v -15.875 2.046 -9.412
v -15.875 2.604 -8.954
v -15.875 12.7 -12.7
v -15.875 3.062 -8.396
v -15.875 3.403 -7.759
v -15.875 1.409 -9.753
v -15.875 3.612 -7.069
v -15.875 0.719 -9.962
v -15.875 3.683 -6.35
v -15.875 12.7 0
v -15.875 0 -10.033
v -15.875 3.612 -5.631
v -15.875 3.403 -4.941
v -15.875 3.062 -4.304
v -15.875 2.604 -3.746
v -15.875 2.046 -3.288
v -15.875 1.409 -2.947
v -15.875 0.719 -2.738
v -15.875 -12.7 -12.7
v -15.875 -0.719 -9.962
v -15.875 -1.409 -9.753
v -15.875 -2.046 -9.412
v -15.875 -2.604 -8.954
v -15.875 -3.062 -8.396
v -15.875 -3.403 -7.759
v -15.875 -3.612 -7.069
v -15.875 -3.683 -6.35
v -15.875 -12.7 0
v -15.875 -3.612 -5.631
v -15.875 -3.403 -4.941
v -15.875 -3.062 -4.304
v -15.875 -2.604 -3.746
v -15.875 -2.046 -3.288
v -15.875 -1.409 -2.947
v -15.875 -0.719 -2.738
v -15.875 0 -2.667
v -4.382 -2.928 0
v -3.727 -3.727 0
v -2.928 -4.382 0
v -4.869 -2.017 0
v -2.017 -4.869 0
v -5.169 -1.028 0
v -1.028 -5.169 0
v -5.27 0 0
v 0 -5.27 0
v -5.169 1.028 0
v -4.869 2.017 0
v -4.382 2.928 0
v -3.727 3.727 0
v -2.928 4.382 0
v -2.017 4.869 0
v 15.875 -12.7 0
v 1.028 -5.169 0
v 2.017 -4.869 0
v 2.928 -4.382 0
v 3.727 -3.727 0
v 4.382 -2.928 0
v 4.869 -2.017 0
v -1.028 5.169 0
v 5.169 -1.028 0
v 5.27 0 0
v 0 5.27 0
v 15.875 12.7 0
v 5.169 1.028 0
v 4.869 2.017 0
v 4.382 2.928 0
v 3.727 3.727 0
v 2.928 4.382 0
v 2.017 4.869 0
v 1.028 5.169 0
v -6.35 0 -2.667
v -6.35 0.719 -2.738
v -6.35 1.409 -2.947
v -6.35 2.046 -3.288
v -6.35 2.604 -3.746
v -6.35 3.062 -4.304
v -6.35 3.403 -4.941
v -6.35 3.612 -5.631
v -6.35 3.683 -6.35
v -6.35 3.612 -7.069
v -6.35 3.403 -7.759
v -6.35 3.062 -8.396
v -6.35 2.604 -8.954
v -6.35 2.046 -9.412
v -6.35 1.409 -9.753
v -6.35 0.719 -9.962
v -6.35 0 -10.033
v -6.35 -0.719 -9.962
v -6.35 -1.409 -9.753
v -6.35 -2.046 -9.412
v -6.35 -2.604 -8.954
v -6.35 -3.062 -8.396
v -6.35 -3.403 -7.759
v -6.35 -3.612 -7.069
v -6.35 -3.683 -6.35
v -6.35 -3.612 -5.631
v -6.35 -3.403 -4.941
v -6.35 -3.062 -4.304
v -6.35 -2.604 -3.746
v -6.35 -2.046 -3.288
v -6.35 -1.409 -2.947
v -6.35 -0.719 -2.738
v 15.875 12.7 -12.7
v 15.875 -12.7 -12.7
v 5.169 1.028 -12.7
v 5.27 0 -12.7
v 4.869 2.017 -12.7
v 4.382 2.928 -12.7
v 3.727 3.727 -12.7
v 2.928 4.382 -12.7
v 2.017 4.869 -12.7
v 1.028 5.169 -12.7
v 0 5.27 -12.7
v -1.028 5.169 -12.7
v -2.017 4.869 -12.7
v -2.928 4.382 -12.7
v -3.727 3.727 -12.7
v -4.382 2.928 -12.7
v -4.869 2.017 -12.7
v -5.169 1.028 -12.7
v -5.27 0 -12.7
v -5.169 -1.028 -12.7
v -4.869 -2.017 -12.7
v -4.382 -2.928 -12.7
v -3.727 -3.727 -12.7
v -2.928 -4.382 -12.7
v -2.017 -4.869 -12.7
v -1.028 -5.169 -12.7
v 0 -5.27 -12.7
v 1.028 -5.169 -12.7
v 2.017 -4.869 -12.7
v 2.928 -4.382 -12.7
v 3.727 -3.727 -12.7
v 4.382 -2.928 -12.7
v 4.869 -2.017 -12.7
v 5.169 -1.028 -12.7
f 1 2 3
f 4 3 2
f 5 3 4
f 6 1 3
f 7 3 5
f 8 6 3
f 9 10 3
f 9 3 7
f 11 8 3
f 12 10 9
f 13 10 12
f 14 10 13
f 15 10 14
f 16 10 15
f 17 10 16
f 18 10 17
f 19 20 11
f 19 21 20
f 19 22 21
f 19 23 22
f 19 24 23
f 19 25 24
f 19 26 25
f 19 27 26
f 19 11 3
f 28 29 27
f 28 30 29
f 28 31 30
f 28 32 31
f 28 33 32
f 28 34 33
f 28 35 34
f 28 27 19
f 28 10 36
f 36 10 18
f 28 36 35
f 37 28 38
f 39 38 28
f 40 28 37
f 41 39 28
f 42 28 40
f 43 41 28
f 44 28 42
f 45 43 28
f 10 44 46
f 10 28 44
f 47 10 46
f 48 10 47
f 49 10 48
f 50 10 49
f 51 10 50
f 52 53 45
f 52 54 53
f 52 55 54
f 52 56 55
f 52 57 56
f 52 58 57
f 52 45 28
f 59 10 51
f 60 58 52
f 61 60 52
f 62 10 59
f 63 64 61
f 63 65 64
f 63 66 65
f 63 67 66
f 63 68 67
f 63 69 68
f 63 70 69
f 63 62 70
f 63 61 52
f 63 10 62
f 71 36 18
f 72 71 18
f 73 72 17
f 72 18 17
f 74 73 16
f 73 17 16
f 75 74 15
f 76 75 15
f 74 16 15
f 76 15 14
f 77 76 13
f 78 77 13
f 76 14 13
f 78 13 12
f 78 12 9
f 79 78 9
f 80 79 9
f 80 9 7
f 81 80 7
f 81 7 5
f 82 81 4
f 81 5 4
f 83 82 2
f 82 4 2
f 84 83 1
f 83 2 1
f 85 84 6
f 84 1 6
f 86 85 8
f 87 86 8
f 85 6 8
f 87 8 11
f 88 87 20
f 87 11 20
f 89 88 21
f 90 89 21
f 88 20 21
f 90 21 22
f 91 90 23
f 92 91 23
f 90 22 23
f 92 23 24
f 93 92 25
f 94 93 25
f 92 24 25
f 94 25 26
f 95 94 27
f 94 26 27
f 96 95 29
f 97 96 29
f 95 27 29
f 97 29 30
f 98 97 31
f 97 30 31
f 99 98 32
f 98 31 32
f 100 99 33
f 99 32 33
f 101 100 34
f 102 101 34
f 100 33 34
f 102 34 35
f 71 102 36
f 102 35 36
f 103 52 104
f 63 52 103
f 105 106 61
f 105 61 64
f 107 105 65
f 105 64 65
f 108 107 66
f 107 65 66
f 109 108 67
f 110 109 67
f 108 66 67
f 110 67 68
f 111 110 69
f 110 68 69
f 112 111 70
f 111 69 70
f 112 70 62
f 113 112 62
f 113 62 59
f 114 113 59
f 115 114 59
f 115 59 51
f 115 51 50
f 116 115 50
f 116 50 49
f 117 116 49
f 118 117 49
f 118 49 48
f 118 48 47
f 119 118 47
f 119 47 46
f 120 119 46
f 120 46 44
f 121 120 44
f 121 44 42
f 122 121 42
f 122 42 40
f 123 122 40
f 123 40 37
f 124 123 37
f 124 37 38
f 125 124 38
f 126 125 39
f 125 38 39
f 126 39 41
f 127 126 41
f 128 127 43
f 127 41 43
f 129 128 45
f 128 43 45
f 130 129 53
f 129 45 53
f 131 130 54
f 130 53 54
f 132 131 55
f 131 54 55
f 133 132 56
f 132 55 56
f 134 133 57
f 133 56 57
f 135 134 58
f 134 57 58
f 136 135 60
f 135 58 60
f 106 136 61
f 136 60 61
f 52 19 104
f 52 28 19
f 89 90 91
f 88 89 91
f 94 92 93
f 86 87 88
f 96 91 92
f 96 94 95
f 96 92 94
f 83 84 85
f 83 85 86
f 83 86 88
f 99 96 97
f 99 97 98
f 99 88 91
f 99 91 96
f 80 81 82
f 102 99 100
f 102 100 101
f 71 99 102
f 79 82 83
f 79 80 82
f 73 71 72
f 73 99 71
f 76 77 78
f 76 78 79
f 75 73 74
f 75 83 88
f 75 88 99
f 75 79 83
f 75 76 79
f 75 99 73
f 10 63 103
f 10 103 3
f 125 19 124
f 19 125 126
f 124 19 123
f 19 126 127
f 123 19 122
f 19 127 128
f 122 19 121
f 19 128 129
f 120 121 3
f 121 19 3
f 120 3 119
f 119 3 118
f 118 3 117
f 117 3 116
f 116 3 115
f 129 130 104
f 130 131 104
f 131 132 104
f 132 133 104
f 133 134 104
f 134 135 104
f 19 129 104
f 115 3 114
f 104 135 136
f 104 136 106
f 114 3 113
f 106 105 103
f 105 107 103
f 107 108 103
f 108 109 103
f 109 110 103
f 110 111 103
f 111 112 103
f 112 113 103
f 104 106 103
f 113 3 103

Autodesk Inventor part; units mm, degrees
ref_plane "YZ Plane" through (0, 0, 0) normal (1, 0, 0) x (0, 1, 0)
ref_plane "XZ Plane" through (0, 0, 0) normal (0, 1, 0) x (-1, 0, 0)
ref_plane "XY Plane" through (0, 0, 0) normal (0, 0, 1) x (1, 0, 0)
sketch "Sketch1" plane through (0, 0, 0) normal (0, 0, 1) x (1, 0, 0)
  line L0 (-15.875, -12.7) -> (15.875, -12.7)
  line L1 (15.875, -12.7) -> (15.875, 12.7)
  line L2 (15.875, 12.7) -> (-15.875, 12.7)
  line L3 (-15.875, 12.7) -> (-15.875, -12.7)
  line L4 (-15.875, -12.7) -> (15.875, 12.7) construction
  line L5 (15.875, -12.7) -> (-15.875, 12.7) construction
  point P0 (0, 0)
  dimension "d0" = 31.75
  dimension "d1" = 25.4
extrude "Extrusion1" add sketch "Sketch1" against normal blind 12.7
sketch "Sketch2" plane through (-15.875, -12.7, 0) normal (-1, 0, 0) x (0, 0, 1)
  line L0 (-12.7, 0) -> (-12.7, 25.4) construction
  line L1 (0, 25.4) -> (0, 0) construction
  line L2 (-12.7, 25.4) -> (0, 0) construction
  line L3 (0, 25.4) -> (-12.7, 0) construction
  circle A0 centre (-6.35, 12.7) radius 3.683
  point P0 (0, 12.7)
  dimension "d4" = 7.366
extrude "Extrusion2" cut sketch "Sketch2" against normal blind 9.525
sketch "Sketch3" plane through (0, 0, 0) normal (0, 0, 1) x (1, 0, 0)
  circle A0 centre (0, 0) radius 5.2705
  dimension "d7" = 10.541
extrude "Extrusion3" cut sketch "Sketch3" against normal through all
properties part number "tieRod"
